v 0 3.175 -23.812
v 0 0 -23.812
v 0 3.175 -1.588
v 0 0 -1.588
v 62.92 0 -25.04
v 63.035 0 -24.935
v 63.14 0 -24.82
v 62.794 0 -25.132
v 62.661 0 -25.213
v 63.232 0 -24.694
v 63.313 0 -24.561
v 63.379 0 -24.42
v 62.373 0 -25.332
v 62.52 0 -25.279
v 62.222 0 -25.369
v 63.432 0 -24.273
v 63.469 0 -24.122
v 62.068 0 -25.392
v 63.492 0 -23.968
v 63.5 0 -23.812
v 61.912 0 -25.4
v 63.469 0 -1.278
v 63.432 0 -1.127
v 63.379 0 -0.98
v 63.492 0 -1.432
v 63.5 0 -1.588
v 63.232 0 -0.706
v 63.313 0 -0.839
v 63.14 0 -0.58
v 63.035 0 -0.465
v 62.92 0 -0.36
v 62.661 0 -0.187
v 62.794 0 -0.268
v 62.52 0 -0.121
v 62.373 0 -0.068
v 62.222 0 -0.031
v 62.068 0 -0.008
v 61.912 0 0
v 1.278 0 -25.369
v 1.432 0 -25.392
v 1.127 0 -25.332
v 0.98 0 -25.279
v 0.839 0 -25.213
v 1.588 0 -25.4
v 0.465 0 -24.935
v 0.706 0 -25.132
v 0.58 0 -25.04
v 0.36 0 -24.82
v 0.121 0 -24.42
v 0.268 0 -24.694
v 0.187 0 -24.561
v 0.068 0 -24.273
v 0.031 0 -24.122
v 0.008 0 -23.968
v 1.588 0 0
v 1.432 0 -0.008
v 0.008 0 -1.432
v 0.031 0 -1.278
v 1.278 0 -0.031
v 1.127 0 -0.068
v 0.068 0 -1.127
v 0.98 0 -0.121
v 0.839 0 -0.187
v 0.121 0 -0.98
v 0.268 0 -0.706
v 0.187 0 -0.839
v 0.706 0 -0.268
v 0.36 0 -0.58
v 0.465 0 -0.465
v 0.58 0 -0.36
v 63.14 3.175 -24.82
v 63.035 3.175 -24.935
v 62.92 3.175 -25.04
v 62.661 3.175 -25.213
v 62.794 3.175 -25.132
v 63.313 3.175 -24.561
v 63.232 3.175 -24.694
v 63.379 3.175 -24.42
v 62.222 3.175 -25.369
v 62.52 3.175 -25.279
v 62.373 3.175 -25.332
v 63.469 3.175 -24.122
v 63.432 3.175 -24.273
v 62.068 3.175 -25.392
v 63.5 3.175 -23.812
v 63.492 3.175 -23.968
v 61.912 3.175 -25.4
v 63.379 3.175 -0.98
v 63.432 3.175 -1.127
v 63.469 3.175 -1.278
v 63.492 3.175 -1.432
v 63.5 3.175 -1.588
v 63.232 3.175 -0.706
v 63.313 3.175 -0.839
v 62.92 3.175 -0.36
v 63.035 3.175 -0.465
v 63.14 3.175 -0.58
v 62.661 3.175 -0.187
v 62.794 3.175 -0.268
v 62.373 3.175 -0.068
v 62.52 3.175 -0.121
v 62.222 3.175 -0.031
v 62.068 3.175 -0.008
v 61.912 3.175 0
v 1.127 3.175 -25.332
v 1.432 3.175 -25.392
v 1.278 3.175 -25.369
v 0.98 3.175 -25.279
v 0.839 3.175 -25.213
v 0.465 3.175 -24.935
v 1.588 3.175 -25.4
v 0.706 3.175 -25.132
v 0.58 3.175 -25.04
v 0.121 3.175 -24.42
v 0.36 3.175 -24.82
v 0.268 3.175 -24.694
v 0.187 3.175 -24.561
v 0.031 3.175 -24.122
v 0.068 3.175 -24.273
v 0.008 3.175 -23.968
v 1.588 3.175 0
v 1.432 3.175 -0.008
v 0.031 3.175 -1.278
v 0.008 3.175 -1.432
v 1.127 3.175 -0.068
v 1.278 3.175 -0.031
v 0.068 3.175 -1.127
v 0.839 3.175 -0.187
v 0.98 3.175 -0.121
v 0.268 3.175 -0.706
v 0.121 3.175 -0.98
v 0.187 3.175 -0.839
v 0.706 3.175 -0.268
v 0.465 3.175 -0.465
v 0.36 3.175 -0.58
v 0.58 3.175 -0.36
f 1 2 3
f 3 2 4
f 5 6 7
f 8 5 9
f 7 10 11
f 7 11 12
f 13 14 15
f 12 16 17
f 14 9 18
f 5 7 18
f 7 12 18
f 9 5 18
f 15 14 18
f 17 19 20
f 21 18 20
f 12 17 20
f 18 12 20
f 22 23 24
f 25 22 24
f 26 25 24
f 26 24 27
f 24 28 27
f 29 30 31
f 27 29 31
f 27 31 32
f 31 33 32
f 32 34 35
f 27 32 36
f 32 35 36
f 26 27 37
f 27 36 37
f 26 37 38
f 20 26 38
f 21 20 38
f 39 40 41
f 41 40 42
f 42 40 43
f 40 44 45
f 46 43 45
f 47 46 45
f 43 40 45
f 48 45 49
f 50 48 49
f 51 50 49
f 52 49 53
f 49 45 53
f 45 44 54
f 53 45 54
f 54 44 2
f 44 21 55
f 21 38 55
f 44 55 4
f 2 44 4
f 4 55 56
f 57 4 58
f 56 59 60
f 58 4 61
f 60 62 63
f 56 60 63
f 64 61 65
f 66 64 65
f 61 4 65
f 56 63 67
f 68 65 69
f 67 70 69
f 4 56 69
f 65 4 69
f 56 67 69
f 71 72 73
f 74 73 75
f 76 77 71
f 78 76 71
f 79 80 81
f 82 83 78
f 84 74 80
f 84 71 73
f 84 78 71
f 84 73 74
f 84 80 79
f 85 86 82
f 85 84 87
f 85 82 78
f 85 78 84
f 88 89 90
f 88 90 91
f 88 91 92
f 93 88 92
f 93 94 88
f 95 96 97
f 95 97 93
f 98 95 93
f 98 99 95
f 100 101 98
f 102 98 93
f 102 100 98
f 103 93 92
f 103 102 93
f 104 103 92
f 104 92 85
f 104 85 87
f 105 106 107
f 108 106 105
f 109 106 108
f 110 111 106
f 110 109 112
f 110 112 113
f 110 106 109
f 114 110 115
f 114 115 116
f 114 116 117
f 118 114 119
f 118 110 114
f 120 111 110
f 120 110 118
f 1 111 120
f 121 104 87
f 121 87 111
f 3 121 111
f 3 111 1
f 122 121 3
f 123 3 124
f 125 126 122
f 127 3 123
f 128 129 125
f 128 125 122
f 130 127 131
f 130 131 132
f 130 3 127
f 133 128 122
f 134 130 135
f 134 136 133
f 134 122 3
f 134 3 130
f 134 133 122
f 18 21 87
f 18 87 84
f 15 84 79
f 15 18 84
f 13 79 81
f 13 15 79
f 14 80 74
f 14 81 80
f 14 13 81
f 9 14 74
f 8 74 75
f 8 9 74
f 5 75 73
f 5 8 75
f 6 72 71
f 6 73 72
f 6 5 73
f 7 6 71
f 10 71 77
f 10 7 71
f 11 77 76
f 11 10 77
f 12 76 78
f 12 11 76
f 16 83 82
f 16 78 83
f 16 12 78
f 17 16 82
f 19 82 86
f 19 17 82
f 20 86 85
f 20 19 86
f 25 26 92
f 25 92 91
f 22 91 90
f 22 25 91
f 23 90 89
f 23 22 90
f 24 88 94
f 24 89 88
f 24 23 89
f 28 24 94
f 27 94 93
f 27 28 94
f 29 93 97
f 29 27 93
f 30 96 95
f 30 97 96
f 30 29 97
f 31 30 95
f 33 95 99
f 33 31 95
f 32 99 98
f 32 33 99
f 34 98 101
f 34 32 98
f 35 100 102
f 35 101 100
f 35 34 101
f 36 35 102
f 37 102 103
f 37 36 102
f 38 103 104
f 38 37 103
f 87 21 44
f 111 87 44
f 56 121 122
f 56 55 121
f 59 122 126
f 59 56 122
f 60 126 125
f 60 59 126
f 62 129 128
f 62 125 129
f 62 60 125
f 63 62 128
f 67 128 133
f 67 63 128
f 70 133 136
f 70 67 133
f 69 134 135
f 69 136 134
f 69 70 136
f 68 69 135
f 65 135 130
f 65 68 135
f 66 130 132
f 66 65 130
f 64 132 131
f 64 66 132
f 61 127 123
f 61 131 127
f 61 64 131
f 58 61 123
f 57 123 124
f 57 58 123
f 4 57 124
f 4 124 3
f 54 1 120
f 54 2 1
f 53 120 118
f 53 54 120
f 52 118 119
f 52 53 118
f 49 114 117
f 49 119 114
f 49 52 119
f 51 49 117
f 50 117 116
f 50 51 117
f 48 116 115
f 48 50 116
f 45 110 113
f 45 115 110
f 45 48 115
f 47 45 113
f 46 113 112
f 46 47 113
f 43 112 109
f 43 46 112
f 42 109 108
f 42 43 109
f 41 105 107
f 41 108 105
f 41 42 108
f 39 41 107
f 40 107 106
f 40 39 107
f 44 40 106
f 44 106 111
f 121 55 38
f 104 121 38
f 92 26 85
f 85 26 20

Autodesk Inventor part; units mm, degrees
ref_plane "YZ Plane" through (0, 0, 0) normal (1, 0, 0) x (0, 1, 0)
ref_plane "XZ Plane" through (0, 0, 0) normal (0, 1, 0) x (-1, 0, 0)
ref_plane "XY Plane" through (0, 0, 0) normal (0, 0, 1) x (1, 0, 0)
sketch "Sketch1" plane through (0, 0, 0) normal (0, 1, 0) x (-1, 0, 0)
  arc A0 (-63.5, -23.8125) -> (-61.9125, -25.4) centre (-61.9125, -23.8125) ccw
  line L0 (-61.9125, -25.4) -> (-1.5875, -25.4)
  arc A1 (-1.5875, -25.4) -> (0, -23.8125) centre (-1.5875, -23.8125) ccw
  line L1 (0, -23.8125) -> (0, -1.5875)
  arc A2 (0, -1.5875) -> (-1.5875, 0) centre (-1.5875, -1.5875) ccw
  line L2 (-1.5875, 0) -> (-61.9125, 0)
  arc A3 (-61.9125, 0) -> (-63.5, -1.5875) centre (-61.9125, -1.5875) ccw
  line L3 (-63.5, -1.5875) -> (-63.5, -23.8125)
  circle A4 centre (-53.975, -12.7) radius 3.302
  circle A5 centre (-9.525, -12.7) radius 3.302
  point P0 (0, 0)
  point P1 (0, 0)
extrude "Plate1" add sketch "Sketch1" along normal blind 3.175 contours L3 A3 L2 A2 L1 A1 L0 A0 | A4 | A5
equation "\"BendRadius\" = Thickness"
equation "\"BendReliefWidth\" = Thickness"
equation "\"BendReliefDepth\" = 0.5 * Thickness"
equation "\"CornerReliefSize\" = 4 * Thickness"
equation "\"MinimumRemnant\" = 2 * Thickness"
equation "\"TransitionRadius\" = BendRadius"
equation "\"JacobiRadiusSize\" = BendRadius"
equation "\"GapSize\" = Thickness"
equation "\"d0\" = BendRadius"
equation "\"Thickness\" = 3.175"
properties part number "Support for bracket" material "Aluminum 6061"
